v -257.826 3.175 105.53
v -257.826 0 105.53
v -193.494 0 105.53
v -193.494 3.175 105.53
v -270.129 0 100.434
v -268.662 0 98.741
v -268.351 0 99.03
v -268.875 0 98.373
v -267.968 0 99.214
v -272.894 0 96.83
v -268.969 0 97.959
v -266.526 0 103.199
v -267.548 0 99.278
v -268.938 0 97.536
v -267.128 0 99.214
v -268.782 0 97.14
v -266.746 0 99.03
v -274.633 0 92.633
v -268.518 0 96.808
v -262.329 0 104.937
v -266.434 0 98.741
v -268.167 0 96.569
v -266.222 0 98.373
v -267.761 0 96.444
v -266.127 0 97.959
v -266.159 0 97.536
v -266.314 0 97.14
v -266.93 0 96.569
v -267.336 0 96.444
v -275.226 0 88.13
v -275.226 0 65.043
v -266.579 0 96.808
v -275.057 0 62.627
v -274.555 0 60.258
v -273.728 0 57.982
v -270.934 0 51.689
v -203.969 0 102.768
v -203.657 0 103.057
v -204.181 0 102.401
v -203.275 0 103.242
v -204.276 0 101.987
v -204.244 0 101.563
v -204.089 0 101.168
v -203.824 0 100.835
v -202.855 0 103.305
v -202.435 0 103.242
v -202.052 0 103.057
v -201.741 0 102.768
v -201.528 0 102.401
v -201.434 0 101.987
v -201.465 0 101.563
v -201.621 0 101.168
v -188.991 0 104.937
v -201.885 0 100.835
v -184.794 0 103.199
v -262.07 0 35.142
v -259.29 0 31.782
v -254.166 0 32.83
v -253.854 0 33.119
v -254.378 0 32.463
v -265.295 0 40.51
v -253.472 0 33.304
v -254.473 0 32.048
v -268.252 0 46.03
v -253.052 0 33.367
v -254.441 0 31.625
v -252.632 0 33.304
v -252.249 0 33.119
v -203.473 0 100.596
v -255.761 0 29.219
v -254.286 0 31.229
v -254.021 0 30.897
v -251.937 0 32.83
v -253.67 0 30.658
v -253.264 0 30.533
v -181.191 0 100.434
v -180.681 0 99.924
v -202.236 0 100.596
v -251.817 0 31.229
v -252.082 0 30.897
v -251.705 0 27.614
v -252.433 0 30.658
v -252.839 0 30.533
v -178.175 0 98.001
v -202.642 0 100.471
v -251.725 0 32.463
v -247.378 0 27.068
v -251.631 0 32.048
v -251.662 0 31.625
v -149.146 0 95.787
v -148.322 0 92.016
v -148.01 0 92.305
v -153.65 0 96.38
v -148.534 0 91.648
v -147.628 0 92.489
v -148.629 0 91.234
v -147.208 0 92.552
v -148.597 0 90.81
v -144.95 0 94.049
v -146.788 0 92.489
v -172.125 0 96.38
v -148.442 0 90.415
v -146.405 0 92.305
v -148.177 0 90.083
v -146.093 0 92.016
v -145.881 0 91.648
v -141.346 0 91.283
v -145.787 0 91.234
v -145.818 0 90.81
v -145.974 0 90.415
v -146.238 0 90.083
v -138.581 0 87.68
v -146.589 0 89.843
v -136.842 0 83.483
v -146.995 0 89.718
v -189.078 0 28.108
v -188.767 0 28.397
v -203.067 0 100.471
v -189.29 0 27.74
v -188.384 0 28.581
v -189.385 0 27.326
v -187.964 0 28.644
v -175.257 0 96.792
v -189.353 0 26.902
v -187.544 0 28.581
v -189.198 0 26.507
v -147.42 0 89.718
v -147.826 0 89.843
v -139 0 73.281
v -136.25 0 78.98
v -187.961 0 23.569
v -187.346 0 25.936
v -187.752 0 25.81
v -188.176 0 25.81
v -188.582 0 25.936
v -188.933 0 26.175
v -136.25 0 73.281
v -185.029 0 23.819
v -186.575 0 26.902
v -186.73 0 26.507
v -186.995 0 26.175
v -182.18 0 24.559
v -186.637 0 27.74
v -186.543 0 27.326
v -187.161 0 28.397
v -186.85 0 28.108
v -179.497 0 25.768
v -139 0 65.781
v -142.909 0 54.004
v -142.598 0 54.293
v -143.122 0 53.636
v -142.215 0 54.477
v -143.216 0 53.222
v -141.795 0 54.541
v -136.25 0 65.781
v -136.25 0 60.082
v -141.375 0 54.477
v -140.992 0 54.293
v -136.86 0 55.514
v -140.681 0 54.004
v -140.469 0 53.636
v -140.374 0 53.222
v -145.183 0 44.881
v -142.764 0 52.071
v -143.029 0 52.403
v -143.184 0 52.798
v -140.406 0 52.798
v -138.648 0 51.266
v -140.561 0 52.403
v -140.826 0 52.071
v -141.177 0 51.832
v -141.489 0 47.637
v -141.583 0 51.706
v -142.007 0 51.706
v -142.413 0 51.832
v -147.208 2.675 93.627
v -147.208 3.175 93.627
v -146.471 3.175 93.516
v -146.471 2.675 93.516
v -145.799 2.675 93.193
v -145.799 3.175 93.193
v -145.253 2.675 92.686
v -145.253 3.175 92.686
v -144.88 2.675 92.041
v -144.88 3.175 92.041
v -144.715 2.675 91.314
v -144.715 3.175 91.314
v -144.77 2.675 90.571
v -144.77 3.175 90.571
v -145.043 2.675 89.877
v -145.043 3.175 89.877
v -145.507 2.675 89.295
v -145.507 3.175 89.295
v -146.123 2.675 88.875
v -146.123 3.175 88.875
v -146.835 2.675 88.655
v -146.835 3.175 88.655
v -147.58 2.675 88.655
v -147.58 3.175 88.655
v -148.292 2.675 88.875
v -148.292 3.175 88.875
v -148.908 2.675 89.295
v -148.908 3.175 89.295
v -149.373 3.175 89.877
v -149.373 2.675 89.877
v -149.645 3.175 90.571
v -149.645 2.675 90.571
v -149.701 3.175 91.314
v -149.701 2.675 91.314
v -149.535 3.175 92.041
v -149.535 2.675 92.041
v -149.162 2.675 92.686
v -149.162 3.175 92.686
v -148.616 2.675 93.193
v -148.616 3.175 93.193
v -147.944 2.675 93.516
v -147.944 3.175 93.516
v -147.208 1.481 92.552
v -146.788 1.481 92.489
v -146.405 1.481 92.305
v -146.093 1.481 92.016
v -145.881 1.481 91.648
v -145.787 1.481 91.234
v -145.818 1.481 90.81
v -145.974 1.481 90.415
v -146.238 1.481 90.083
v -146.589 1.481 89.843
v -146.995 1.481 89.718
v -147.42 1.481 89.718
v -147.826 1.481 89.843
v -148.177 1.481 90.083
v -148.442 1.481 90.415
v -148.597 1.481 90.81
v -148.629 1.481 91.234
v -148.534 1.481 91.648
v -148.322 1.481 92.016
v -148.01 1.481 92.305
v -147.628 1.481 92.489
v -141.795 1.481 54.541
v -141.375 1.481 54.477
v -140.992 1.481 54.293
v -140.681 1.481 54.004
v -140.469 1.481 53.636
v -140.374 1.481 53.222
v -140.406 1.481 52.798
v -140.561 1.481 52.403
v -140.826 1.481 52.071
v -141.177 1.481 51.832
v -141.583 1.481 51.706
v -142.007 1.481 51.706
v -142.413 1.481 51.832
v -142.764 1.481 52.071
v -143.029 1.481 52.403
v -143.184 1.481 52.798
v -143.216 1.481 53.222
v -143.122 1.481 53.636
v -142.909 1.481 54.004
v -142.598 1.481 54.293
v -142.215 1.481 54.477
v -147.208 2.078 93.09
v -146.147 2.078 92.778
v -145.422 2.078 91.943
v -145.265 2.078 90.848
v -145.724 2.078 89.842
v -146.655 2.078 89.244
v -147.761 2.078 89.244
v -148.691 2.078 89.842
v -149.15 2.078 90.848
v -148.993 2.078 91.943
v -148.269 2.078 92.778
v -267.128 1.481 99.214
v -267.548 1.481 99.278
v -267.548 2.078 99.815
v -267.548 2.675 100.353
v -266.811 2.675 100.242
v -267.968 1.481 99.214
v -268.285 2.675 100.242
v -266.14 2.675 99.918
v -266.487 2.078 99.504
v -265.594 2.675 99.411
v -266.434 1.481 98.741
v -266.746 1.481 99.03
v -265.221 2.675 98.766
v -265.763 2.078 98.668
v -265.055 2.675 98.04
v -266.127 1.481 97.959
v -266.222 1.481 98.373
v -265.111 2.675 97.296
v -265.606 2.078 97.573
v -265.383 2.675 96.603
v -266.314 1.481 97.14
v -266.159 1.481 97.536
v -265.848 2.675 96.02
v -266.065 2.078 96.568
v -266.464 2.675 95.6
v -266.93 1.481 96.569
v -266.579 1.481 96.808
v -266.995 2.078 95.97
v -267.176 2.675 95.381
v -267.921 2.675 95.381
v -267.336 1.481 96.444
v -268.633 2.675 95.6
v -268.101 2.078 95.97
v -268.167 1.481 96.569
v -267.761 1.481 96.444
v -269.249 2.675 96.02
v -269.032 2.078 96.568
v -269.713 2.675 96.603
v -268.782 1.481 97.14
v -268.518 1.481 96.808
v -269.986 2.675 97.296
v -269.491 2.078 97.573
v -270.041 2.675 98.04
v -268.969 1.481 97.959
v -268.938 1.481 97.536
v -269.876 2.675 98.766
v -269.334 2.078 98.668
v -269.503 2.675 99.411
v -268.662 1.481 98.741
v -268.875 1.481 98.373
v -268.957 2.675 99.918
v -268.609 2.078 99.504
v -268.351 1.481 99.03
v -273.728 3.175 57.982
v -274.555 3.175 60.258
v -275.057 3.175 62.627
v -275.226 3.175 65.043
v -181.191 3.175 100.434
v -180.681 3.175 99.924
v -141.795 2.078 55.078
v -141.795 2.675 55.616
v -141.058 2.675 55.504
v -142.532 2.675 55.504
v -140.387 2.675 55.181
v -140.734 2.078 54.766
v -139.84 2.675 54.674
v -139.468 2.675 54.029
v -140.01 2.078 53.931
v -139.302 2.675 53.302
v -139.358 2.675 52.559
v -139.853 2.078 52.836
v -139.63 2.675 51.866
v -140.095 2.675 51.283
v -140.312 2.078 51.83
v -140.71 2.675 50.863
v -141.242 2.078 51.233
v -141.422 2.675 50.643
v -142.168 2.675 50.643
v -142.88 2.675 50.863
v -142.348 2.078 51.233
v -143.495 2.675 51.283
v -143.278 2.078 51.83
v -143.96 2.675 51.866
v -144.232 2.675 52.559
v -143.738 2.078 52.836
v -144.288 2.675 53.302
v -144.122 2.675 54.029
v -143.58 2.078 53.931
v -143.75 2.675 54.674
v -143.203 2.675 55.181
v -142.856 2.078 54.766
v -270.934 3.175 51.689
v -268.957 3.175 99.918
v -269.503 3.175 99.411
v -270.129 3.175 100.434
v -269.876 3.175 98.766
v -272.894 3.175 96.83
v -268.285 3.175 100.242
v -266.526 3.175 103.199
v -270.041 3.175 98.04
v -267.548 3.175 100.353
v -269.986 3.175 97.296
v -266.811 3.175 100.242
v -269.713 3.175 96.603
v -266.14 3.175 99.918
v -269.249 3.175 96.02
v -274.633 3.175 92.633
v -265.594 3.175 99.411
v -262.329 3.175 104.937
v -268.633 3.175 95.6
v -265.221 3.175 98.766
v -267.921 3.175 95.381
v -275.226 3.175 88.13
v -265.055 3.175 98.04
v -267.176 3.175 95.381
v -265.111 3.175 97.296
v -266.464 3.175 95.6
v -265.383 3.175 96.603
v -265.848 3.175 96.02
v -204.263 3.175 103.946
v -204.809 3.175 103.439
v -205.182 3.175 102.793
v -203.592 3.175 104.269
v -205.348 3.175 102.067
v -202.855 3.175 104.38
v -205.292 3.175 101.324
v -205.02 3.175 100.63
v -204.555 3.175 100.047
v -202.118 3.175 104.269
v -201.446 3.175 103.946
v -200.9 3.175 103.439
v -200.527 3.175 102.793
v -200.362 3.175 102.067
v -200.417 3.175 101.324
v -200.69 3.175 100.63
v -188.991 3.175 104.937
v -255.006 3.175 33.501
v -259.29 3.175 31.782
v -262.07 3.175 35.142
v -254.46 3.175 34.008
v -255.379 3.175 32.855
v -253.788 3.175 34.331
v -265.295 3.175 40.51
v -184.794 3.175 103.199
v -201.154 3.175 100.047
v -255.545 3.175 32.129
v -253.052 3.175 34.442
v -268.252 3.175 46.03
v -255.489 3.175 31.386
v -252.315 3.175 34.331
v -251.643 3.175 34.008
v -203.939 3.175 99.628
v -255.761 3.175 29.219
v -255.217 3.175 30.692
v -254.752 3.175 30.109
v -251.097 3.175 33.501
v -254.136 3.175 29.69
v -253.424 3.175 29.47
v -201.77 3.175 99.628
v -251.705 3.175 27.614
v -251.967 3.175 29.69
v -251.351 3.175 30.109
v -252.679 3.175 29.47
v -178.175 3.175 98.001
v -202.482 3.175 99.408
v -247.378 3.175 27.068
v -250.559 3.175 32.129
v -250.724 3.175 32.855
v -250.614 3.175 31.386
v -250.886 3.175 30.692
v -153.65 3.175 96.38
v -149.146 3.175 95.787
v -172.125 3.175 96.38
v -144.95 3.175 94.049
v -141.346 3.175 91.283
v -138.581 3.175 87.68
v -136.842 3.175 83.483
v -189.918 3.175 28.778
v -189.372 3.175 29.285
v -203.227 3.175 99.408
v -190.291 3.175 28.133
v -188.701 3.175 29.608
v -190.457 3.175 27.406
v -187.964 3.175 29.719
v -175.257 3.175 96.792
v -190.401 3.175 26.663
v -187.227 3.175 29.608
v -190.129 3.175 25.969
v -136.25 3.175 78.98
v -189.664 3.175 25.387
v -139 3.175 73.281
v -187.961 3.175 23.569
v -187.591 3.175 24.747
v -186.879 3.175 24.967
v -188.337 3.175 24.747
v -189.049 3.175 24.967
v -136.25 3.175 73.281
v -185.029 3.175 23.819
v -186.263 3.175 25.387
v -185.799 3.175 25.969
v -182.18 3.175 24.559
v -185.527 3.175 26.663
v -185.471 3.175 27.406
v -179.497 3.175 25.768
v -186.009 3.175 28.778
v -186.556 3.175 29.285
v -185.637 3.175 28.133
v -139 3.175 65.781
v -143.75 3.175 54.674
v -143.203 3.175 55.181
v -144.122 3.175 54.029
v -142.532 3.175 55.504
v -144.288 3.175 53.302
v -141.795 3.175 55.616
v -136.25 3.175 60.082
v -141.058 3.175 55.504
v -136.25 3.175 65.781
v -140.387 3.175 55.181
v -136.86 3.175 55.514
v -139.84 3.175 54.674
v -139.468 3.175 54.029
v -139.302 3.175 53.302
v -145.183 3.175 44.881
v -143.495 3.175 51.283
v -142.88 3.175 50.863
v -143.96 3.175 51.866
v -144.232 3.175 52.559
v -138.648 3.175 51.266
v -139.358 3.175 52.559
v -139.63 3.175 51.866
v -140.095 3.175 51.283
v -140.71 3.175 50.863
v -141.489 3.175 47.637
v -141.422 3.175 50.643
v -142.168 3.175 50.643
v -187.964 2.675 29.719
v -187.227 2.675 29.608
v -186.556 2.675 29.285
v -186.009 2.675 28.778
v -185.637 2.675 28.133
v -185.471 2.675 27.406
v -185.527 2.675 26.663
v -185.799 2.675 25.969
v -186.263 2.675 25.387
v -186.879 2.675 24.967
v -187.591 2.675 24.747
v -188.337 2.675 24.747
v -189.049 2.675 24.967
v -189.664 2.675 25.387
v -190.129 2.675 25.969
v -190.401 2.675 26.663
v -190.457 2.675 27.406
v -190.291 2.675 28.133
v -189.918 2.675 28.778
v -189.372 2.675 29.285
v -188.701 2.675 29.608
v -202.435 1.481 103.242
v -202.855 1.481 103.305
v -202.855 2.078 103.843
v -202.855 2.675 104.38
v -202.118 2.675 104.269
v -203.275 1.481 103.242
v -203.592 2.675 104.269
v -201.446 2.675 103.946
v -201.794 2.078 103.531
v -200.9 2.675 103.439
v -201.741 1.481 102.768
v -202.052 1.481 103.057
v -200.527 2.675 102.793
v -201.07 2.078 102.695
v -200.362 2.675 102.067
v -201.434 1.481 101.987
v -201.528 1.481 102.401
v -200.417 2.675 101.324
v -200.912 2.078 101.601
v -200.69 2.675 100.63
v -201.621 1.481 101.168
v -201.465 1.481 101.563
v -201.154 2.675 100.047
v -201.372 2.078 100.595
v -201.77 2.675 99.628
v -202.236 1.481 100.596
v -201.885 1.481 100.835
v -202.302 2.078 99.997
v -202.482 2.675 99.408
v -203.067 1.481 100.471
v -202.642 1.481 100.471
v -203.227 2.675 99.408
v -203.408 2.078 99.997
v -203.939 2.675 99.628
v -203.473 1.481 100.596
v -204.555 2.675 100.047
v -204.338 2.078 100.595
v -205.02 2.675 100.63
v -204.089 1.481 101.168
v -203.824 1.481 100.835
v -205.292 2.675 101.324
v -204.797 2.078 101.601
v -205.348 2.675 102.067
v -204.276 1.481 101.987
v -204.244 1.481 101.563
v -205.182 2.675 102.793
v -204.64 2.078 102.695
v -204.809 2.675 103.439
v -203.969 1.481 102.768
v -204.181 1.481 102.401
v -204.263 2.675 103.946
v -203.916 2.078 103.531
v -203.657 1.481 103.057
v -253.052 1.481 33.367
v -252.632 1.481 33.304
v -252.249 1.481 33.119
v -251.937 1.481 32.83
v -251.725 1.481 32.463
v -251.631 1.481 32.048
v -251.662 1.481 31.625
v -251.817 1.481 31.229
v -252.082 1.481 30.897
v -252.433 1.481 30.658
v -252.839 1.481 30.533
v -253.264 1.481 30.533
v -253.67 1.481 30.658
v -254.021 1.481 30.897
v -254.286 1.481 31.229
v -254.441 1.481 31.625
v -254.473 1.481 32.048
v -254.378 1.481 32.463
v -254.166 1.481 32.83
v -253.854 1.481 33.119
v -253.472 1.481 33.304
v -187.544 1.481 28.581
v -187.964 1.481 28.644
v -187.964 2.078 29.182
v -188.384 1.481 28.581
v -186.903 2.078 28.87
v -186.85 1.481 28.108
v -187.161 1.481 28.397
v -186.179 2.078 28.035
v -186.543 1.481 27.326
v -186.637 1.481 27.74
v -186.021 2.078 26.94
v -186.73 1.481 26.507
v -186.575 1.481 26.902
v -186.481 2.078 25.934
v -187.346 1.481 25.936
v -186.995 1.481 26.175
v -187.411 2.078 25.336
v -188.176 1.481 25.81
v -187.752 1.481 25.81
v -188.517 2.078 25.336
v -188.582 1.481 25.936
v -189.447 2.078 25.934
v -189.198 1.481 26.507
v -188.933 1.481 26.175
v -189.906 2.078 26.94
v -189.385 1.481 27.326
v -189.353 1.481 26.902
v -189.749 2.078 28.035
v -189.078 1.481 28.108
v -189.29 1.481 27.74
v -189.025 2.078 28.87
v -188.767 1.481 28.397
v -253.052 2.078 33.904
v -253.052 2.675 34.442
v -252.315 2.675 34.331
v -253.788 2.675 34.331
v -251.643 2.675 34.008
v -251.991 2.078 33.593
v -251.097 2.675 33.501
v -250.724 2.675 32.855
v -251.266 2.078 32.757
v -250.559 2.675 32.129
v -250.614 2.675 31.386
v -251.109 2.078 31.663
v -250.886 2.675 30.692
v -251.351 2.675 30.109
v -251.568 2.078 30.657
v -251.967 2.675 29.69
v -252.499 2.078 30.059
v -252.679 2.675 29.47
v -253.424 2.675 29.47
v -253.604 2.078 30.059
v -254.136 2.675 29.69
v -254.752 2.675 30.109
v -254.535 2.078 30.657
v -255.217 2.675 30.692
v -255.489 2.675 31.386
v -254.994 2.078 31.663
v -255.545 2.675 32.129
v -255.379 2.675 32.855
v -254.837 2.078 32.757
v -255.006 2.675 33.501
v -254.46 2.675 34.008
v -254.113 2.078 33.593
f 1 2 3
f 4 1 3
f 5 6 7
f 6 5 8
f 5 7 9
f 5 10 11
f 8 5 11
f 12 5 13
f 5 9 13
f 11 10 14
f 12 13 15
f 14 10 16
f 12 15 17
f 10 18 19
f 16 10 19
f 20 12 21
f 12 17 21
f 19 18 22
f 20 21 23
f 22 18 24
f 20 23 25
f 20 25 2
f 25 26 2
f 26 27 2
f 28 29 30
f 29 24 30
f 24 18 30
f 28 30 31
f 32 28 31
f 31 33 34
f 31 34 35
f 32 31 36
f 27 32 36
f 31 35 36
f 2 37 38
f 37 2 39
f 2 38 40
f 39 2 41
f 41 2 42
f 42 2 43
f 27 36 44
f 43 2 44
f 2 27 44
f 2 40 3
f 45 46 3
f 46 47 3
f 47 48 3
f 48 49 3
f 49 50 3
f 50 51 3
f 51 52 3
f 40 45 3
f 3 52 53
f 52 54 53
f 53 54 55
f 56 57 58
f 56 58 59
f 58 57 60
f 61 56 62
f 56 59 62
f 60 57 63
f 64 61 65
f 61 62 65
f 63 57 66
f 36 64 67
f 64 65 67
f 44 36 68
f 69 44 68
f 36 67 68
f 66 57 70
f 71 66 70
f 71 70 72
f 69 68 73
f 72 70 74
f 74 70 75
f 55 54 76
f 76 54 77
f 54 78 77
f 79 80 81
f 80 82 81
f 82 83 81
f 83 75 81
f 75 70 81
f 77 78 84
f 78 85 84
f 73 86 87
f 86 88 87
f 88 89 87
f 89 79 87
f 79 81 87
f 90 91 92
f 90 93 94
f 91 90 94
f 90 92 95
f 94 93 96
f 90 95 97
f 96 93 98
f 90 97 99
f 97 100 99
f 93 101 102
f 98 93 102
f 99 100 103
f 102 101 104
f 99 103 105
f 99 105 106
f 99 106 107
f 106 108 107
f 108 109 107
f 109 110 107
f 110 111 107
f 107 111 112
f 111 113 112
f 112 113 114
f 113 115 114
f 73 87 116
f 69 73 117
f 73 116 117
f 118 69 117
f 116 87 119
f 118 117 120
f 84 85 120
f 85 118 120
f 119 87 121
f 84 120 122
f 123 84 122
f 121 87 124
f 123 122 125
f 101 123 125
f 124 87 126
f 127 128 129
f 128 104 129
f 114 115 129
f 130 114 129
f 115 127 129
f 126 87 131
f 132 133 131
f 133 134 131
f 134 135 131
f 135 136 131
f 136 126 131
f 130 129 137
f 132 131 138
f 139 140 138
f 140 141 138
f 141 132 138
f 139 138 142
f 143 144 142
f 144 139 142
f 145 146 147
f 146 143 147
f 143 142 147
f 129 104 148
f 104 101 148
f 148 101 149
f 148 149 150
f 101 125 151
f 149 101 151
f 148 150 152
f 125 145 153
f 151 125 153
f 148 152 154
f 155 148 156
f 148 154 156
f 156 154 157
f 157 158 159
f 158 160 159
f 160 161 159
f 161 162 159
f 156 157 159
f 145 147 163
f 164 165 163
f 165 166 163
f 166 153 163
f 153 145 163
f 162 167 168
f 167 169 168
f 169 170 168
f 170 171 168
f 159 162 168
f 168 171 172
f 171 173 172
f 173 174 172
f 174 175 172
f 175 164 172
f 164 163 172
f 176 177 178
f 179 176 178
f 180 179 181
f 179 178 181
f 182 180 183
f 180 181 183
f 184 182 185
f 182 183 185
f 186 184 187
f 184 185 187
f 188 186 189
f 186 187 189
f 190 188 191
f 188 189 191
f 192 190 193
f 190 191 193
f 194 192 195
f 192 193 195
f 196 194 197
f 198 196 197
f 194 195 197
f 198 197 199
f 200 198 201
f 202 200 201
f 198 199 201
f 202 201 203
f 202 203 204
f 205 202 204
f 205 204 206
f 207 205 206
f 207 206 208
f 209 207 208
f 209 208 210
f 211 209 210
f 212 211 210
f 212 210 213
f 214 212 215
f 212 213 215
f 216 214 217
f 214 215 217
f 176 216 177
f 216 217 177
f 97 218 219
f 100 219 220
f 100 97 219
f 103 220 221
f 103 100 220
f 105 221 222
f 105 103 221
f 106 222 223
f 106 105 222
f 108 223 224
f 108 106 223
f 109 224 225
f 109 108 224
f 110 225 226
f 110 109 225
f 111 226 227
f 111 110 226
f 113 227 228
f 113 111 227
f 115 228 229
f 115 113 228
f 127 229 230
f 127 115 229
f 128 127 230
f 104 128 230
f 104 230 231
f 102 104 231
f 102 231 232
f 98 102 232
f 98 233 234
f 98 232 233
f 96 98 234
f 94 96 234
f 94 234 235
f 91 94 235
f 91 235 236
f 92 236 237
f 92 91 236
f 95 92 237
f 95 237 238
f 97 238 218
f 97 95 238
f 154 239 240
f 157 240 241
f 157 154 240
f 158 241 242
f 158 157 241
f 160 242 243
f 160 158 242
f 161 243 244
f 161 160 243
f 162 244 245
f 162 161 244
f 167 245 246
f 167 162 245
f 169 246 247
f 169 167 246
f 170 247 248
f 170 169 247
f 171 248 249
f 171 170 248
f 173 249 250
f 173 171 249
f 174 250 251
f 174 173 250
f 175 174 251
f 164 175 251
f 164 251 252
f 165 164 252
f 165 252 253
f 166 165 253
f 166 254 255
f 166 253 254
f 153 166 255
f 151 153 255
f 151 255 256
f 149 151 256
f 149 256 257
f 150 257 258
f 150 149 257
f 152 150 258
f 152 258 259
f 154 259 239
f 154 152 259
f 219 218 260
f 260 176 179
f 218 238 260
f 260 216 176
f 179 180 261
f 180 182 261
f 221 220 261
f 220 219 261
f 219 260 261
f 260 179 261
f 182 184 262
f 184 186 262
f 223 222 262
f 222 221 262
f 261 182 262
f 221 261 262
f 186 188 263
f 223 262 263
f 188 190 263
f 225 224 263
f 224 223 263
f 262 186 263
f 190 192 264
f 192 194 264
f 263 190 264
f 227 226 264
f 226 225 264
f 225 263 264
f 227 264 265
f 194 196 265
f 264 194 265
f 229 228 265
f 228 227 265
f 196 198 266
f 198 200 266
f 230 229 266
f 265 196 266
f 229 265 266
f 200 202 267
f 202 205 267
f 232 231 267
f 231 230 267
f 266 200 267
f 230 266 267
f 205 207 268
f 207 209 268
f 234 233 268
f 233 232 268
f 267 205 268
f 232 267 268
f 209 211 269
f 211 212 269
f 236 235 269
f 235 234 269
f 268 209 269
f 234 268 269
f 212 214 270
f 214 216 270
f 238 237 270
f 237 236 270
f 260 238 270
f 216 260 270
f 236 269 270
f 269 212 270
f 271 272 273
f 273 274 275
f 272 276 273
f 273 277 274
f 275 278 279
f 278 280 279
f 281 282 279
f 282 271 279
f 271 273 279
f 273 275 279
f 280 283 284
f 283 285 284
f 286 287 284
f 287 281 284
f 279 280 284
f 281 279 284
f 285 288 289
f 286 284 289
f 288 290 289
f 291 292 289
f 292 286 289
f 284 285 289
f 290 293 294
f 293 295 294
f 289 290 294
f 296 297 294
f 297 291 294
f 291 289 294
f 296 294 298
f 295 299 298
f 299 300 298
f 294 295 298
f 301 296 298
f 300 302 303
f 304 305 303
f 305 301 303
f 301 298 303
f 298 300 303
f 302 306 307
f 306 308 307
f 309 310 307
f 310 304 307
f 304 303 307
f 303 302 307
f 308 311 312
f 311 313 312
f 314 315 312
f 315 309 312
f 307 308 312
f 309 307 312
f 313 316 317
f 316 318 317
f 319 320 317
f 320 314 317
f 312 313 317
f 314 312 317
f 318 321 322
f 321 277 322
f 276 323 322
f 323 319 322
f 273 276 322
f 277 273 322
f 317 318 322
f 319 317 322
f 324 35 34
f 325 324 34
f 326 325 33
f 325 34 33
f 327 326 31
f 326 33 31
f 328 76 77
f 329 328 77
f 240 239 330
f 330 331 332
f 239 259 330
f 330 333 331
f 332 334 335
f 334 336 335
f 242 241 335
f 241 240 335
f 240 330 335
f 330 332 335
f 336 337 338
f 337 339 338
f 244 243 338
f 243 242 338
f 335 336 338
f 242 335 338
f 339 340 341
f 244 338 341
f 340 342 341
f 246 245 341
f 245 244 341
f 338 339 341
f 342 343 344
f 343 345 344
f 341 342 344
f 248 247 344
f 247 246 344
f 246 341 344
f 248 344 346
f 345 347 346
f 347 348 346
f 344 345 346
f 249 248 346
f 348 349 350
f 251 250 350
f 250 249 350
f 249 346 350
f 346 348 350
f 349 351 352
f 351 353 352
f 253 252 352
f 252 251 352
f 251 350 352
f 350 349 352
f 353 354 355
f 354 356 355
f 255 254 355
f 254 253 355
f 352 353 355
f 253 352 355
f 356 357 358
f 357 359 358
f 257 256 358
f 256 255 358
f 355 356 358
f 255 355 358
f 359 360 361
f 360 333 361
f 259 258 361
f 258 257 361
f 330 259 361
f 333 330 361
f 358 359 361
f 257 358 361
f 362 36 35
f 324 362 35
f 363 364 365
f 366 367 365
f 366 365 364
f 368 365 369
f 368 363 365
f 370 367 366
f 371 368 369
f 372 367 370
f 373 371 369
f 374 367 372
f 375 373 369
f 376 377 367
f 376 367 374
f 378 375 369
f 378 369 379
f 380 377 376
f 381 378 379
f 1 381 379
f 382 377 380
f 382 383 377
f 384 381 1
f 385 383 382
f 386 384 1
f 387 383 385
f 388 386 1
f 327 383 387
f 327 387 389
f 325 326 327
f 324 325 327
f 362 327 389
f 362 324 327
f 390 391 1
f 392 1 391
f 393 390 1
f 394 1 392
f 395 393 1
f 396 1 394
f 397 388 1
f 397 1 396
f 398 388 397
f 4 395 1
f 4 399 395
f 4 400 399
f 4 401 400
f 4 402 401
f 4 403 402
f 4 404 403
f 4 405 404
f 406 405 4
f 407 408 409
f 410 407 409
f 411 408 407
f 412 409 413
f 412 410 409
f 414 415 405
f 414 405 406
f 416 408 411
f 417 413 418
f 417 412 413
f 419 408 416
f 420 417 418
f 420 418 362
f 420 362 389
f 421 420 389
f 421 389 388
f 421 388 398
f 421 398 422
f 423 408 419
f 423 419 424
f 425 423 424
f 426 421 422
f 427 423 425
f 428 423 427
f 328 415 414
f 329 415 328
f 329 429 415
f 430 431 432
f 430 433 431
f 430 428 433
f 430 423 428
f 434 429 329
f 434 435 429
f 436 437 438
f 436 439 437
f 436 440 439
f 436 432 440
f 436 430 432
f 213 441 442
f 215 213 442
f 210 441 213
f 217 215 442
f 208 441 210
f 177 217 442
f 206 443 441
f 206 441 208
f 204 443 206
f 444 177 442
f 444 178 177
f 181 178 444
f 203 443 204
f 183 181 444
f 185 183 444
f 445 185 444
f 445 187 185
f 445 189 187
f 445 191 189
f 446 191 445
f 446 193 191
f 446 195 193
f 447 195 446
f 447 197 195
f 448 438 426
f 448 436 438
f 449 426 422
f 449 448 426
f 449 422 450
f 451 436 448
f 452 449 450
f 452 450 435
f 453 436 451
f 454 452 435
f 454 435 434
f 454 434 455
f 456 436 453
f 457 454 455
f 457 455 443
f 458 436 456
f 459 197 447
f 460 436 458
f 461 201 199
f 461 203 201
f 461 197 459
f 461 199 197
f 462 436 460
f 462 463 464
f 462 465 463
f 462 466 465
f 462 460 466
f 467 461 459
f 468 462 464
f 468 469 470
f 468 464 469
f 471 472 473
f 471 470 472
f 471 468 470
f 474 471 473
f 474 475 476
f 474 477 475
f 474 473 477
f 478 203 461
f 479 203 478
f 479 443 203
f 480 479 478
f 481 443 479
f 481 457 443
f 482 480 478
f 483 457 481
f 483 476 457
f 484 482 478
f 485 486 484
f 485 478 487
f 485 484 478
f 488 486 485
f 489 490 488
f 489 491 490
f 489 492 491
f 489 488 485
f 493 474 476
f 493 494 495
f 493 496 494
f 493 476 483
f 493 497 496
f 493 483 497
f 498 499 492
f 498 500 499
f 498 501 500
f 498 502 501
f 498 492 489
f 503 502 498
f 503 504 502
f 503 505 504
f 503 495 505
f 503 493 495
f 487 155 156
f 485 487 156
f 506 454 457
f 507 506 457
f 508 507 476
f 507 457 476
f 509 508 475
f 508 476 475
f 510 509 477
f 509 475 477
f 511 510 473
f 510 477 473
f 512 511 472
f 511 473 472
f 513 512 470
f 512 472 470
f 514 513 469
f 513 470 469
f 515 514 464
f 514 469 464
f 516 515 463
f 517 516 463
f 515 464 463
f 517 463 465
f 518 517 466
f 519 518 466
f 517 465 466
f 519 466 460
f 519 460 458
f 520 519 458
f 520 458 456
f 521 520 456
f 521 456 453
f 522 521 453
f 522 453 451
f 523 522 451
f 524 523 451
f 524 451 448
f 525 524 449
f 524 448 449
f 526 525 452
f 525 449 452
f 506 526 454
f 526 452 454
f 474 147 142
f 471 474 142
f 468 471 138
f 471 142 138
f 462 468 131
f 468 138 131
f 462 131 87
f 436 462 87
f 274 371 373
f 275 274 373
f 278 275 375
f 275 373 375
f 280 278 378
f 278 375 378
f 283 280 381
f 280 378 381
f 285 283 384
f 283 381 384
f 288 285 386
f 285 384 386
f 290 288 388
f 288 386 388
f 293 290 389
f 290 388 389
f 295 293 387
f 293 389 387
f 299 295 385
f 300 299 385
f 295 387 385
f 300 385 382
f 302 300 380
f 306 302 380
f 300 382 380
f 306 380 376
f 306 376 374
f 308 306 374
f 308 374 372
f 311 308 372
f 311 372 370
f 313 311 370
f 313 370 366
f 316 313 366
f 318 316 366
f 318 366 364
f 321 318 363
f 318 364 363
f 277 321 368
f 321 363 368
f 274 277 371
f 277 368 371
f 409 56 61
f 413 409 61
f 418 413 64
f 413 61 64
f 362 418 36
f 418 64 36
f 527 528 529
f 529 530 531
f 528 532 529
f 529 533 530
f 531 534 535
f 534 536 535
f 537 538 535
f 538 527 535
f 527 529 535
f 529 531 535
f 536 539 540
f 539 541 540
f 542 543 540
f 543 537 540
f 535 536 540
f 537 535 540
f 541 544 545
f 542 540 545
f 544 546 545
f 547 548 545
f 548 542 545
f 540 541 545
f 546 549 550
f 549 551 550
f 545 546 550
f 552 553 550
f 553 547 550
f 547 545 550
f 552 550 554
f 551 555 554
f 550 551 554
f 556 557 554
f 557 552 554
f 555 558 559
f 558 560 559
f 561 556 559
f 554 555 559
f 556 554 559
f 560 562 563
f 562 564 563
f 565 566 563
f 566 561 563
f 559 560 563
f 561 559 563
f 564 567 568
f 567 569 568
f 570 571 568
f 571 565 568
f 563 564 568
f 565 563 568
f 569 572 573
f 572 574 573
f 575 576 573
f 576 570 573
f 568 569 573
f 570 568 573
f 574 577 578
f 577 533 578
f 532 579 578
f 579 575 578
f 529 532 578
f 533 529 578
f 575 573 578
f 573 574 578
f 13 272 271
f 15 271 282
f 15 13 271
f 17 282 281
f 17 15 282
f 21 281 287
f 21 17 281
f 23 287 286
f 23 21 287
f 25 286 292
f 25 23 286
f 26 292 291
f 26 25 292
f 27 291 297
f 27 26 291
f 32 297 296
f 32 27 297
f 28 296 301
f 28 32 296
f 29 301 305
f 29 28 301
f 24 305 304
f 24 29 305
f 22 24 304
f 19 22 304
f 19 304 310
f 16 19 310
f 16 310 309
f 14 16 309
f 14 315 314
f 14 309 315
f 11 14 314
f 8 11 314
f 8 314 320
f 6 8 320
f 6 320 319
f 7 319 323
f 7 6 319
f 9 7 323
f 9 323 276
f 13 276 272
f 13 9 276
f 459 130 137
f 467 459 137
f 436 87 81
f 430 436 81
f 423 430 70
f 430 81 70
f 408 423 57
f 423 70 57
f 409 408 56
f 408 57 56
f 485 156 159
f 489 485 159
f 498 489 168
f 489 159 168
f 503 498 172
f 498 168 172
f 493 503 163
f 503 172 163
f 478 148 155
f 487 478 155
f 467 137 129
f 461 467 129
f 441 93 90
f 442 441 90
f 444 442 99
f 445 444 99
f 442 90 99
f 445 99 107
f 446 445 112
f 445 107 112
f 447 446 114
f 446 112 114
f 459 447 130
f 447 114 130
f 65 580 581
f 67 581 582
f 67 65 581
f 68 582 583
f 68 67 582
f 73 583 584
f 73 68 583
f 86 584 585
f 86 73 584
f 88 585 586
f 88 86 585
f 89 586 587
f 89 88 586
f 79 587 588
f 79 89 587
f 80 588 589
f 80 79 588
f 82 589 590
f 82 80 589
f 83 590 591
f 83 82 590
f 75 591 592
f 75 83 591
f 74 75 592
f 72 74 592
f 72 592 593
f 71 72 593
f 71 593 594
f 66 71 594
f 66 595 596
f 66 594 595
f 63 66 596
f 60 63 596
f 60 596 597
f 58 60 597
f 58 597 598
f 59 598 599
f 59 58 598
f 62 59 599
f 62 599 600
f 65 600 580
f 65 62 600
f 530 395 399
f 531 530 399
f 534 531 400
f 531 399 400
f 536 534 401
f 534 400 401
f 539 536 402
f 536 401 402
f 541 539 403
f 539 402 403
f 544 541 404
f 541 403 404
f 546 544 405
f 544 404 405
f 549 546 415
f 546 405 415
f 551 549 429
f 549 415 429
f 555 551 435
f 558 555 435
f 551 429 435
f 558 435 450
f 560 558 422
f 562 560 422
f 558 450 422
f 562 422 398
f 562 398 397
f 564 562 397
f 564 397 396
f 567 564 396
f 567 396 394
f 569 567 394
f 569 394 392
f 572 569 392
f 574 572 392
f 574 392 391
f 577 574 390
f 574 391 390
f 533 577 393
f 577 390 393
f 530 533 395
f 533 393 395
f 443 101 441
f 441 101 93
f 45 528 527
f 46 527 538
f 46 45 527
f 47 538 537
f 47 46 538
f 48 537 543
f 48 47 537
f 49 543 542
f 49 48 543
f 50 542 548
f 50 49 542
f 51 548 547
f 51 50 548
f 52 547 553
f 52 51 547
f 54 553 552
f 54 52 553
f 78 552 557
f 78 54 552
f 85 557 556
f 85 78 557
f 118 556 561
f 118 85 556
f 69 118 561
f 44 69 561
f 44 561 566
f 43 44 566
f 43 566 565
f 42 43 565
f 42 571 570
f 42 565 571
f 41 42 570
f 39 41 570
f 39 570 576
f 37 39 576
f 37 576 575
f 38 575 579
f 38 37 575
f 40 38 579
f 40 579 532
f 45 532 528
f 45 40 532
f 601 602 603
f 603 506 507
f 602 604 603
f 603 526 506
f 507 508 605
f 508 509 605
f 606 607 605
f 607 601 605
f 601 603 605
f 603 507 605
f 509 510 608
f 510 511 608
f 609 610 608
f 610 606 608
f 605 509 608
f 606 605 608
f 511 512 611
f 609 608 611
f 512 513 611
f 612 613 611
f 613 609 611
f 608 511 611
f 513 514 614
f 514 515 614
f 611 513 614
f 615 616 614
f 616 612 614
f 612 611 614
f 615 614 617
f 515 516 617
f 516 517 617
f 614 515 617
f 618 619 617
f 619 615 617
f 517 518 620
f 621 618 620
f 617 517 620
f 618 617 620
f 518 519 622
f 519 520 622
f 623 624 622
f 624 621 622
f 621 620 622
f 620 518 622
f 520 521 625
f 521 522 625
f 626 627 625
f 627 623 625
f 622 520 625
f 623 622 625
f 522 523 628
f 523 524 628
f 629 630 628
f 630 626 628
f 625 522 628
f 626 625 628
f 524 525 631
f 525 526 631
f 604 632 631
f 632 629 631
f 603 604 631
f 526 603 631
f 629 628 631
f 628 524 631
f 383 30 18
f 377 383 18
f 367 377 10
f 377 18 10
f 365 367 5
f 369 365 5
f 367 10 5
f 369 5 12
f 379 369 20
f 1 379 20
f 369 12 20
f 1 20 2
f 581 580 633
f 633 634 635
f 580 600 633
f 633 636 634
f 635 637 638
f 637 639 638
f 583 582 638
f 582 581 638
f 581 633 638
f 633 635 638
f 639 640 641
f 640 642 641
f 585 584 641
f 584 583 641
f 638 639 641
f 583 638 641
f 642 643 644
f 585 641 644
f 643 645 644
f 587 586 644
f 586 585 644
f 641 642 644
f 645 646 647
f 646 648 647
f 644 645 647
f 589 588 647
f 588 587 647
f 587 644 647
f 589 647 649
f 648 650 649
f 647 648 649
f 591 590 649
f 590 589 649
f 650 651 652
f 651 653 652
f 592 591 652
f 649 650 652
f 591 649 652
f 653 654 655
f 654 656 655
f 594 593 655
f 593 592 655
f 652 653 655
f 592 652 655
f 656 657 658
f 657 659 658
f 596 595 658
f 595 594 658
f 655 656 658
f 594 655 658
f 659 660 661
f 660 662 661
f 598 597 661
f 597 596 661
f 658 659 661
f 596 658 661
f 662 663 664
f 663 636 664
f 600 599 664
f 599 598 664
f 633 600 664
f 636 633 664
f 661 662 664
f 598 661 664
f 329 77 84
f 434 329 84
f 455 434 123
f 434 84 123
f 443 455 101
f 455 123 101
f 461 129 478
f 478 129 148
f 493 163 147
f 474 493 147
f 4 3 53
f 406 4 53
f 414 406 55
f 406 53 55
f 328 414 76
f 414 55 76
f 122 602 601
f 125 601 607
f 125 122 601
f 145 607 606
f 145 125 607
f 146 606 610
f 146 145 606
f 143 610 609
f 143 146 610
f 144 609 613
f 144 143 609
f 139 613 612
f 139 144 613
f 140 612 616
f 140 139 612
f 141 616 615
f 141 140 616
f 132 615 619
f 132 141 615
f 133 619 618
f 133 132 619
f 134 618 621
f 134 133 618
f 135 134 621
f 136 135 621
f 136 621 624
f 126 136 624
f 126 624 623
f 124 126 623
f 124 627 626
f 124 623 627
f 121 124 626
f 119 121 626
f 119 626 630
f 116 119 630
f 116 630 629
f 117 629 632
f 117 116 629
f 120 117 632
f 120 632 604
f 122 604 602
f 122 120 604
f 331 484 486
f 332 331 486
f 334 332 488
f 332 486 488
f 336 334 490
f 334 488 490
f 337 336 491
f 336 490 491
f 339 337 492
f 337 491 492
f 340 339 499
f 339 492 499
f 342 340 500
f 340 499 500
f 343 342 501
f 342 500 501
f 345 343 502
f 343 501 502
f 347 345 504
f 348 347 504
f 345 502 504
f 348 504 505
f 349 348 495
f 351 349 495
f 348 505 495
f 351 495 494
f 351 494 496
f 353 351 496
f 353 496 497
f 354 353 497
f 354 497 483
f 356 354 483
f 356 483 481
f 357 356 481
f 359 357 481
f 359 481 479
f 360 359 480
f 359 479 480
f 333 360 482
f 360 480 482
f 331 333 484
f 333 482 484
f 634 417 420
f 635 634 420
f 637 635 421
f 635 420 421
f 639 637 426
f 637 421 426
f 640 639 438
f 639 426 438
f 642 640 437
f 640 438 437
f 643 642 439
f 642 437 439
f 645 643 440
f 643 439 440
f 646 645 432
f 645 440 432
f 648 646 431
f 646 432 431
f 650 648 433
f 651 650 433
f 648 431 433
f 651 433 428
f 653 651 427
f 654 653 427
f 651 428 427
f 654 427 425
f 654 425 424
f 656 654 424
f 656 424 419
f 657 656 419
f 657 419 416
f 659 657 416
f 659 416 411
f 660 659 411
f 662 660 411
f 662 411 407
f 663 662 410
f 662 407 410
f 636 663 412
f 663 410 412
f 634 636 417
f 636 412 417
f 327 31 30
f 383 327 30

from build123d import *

# Parameters (mm, degrees)
SKETCH2_R                    = 1.425
BOSS_EXTRUDE1_DEPTH          = 3.175
SKETCH3_R                    = 2.5
CUT_EXTRUDE1_DEPTH           = 0.5
SKETCH4_R                    = 2.5
CUT_EXTRUDE2_DEPTH           = 1.2
CUT_EXTRUDE2_DRAFT           = -42
CUT_EXTRUDE2_PROFILE_2_DEPTH = 1.2
CUT_EXTRUDE2_PROFILE_2_DRAFT = -42
CUT_EXTRUDE2_PROFILE_3_DEPTH = 1.2
CUT_EXTRUDE2_PROFILE_3_DRAFT = -42
CUT_EXTRUDE2_PROFILE_4_DEPTH = 1.2
CUT_EXTRUDE2_PROFILE_4_DRAFT = -42
CUT_EXTRUDE2_PROFILE_5_DEPTH = 1.2
CUT_EXTRUDE2_PROFILE_5_DRAFT = -42
CUT_EXTRUDE2_PROFILE_6_DEPTH = 1.2
CUT_EXTRUDE2_PROFILE_6_DRAFT = -42


with BuildPart() as part:
    # Sketch2 → Boss-Extrude1 (new body)
    with BuildSketch(Plane(origin=(0, 0, 0), x_dir=(1, 0, 0), z_dir=(0, 1, 0))):
        with BuildLine():
            Line((-145.18277075, -44.880968233), (-179.497120097, -25.768390824))
            ThreePointArc((-179.497120097, -25.768390824), (-183.588653035, -24.128556812), (-187.960968922, -23.569494069))
            Line((-187.960968922, -23.569494069), (-247.377604545, -27.068041697))
            ThreePointArc((-247.377604545, -27.068041697), (-255.760524502, -29.218913898), (-262.07032604, -35.142257782))
            ThreePointArc((-262.07032604, -35.142257782), (-266.807761783, -43.251676507), (-270.933745897, -51.688632391))
            Line((-270.933745897, -51.688632391), (-273.728235609, -57.981701498))
            ThreePointArc((-273.728235609, -57.981701498), (-274.847170355, -61.434035543), (-275.2256366, -65.043382939))
            Line((-275.2256366, -65.043382939), (-275.2256366, -88.130010281))
            ThreePointArc((-275.2256366, -88.130010281), (-270.129294593, -100.433668273), (-257.8256366, -105.530010281))
            Line((-257.8256366, -105.530010281), (-193.494425739, -105.530010281))
            ThreePointArc((-193.494425739, -105.530010281), (-186.835734016, -104.205514146), (-181.190767747, -100.433668273))
            Line((-181.190767747, -100.433668273), (-180.680815133, -99.923715659))
            ThreePointArc((-180.680815133, -99.923715659), (-176.755292612, -97.300765368), (-172.12482308, -96.379707712))
            Line((-172.12482308, -96.379707712), (-153.649556898, -96.379707712))
            ThreePointArc((-153.649556898, -96.379707712), (-141.345898905, -91.283365704), (-136.249556898, -78.979707712))
            Line((-136.249556898, -78.979707712), (-136.249556898, -73.280889471))
            Line((-136.249556898, -73.280889471), (-138.999556898, -73.280889471))
            Line((-138.999556898, -73.280889471), (-138.999556898, -65.780889471))
            Line((-138.999556898, -65.780889471), (-136.249556898, -65.780889471))
            Line((-136.249556898, -65.780889471), (-136.249556898, -60.08207123))
            ThreePointArc((-136.249556898, -60.08207123), (-138.648188978, -51.266235449), (-145.18277075, -44.880968233))
        make_face()
        with Locations(Location((-147.207602145, -91.127288498, 0), (0, 0, 270))):
            Circle(SKETCH2_R, mode=Mode.SUBTRACT)
        with Locations(Location((-141.795027651, -53.115534334, 0), (0, 0, 270))):
            Circle(SKETCH2_R, mode=Mode.SUBTRACT)
        with Locations(Location((-187.963906245, -27.219493821, 0), (0, 0, 270))):
            Circle(SKETCH2_R, mode=Mode.SUBTRACT)
        with Locations(Location((-253.051529835, -31.941972813, 0), (0, 0, 270))):
            Circle(SKETCH2_R, mode=Mode.SUBTRACT)
        with Locations(Location((-267.548354841, -97.852728522, 0), (0, 0, 270))):
            Circle(SKETCH2_R, mode=Mode.SUBTRACT)
        with Locations(Location((-202.85468144, -101.880010281, 0), (0, 0, 270))):
            Circle(SKETCH2_R, mode=Mode.SUBTRACT)
    extrude(amount=BOSS_EXTRUDE1_DEPTH)

    # Sketch3 → Cut-Extrude1 (cut)
    with BuildSketch(Plane(origin=(0, 3.175, 0), x_dir=(1, 0, 0), z_dir=(0, 1, 0))):
        with Locations(Location((-253.051529835, -31.941972813, 0), (0, 0, 270))):
            Circle(SKETCH3_R)
        with Locations(Location((-187.963906245, -27.219493821, 0), (0, 0, 270))):
            Circle(SKETCH3_R)
        with Locations(Location((-141.795027651, -53.115534334, 0), (0, 0, 270))):
            Circle(SKETCH3_R)
        with Locations(Location((-147.207602145, -91.127288498, 0), (0, 0, 270))):
            Circle(SKETCH3_R)
        with Locations(Location((-202.85468144, -101.880010281, 0), (0, 0, 270))):
            Circle(SKETCH3_R)
        with Locations(Location((-267.548354841, -97.852728522, 0), (0, 0, 270))):
            Circle(SKETCH3_R)
    extrude(amount=-CUT_EXTRUDE1_DEPTH, mode=Mode.SUBTRACT)


with BuildPart() as cut_extrude2_tool:
    # Sketch4 → Cut-Extrude2 (with draft: the straight prism first)
    with BuildSketch(Plane(origin=(0, 2.675, 0), x_dir=(1, 0, 0), z_dir=(0, 1, 0))):
        with Locations(Location((-267.548354841, -97.852728522, 0), (0, 0, 270))):
            Circle(SKETCH4_R)
    extrude(amount=-CUT_EXTRUDE2_DEPTH)
    # Cut-Extrude2: the draft: its side faces are tilted about the plane it starts from
    cut_extrude2_sides = [cut_extrude2_tool.faces().sort_by_distance(p)[0] for p in [
        (-267.548354841, 2.075, 95.352728522),
    ]]
    draft(cut_extrude2_sides, Plane(origin=(0, 2.675, 0), x_dir=(1, 0, 0), z_dir=(0, 1, 0)), CUT_EXTRUDE2_DRAFT)


with BuildPart() as part_1:
    add(part.part)

    # Cut-Extrude2: cut by cut_extrude2_tool
    add(cut_extrude2_tool.part, mode=Mode.SUBTRACT)


with BuildPart() as cut_extrude2_profile_2_tool:
    # Sketch4 → Cut-Extrude2 profile 2 (with draft: the straight prism first)
    with BuildSketch(Plane(origin=(0, 2.675, 0), x_dir=(1, 0, 0), z_dir=(0, 1, 0))):
        with Locations(Location((-202.85468144, -101.880010281, 0), (0, 0, 270))):
            Circle(SKETCH4_R)
    extrude(amount=-CUT_EXTRUDE2_PROFILE_2_DEPTH)
    # Cut-Extrude2 profile 2: the draft: its side faces are tilted about the plane it starts from
    cut_extrude2_profile_2_sides = [cut_extrude2_profile_2_tool.faces().sort_by_distance(p)[0] for p in [
        (-202.85468144, 2.075, 99.380010281),
    ]]
    draft(cut_extrude2_profile_2_sides, Plane(origin=(0, 2.675, 0), x_dir=(1, 0, 0), z_dir=(0, 1, 0)), CUT_EXTRUDE2_PROFILE_2_DRAFT)


with BuildPart() as part_2:
    add(part_1.part)

    # Cut-Extrude2 profile 2: cut by cut_extrude2_profile_2_tool
    add(cut_extrude2_profile_2_tool.part, mode=Mode.SUBTRACT)


with BuildPart() as cut_extrude2_profile_3_tool:
    # Sketch4 → Cut-Extrude2 profile 3 (with draft: the straight prism first)
    with BuildSketch(Plane(origin=(0, 2.675, 0), x_dir=(1, 0, 0), z_dir=(0, 1, 0))):
        with Locations(Location((-147.207602145, -91.127288498, 0), (0, 0, 270))):
            Circle(SKETCH4_R)
    extrude(amount=-CUT_EXTRUDE2_PROFILE_3_DEPTH)
    # Cut-Extrude2 profile 3: the draft: its side faces are tilted about the plane it starts from
    cut_extrude2_profile_3_sides = [cut_extrude2_profile_3_tool.faces().sort_by_distance(p)[0] for p in [
        (-147.207602145, 2.075, 88.627288498),
    ]]
    draft(cut_extrude2_profile_3_sides, Plane(origin=(0, 2.675, 0), x_dir=(1, 0, 0), z_dir=(0, 1, 0)), CUT_EXTRUDE2_PROFILE_3_DRAFT)


with BuildPart() as part_3:
    add(part_2.part)

    # Cut-Extrude2 profile 3: cut by cut_extrude2_profile_3_tool
    add(cut_extrude2_profile_3_tool.part, mode=Mode.SUBTRACT)


with BuildPart() as cut_extrude2_profile_4_tool:
    # Sketch4 → Cut-Extrude2 profile 4 (with draft: the straight prism first)
    with BuildSketch(Plane(origin=(0, 2.675, 0), x_dir=(1, 0, 0), z_dir=(0, 1, 0))):
        with Locations(Location((-141.795027651, -53.115534334, 0), (0, 0, 270))):
            Circle(SKETCH4_R)
    extrude(amount=-CUT_EXTRUDE2_PROFILE_4_DEPTH)
    # Cut-Extrude2 profile 4: the draft: its side faces are tilted about the plane it starts from
    cut_extrude2_profile_4_sides = [cut_extrude2_profile_4_tool.faces().sort_by_distance(p)[0] for p in [
        (-141.795027651, 2.075, 50.615534334),
    ]]
    draft(cut_extrude2_profile_4_sides, Plane(origin=(0, 2.675, 0), x_dir=(1, 0, 0), z_dir=(0, 1, 0)), CUT_EXTRUDE2_PROFILE_4_DRAFT)


with BuildPart() as part_4:
    add(part_3.part)

    # Cut-Extrude2 profile 4: cut by cut_extrude2_profile_4_tool
    add(cut_extrude2_profile_4_tool.part, mode=Mode.SUBTRACT)


with BuildPart() as cut_extrude2_profile_5_tool:
    # Sketch4 → Cut-Extrude2 profile 5 (with draft: the straight prism first)
    with BuildSketch(Plane(origin=(0, 2.675, 0), x_dir=(1, 0, 0), z_dir=(0, 1, 0))):
        with Locations(Location((-187.963906245, -27.219493821, 0), (0, 0, 270))):
            Circle(SKETCH4_R)
    extrude(amount=-CUT_EXTRUDE2_PROFILE_5_DEPTH)
    # Cut-Extrude2 profile 5: the draft: its side faces are tilted about the plane it starts from
    cut_extrude2_profile_5_sides = [cut_extrude2_profile_5_tool.faces().sort_by_distance(p)[0] for p in [
        (-187.963906245, 2.075, 24.719493821),
    ]]
    draft(cut_extrude2_profile_5_sides, Plane(origin=(0, 2.675, 0), x_dir=(1, 0, 0), z_dir=(0, 1, 0)), CUT_EXTRUDE2_PROFILE_5_DRAFT)


with BuildPart() as part_5:
    add(part_4.part)

    # Cut-Extrude2 profile 5: cut by cut_extrude2_profile_5_tool
    add(cut_extrude2_profile_5_tool.part, mode=Mode.SUBTRACT)


with BuildPart() as cut_extrude2_profile_6_tool:
    # Sketch4 → Cut-Extrude2 profile 6 (with draft: the straight prism first)
    with BuildSketch(Plane(origin=(0, 2.675, 0), x_dir=(1, 0, 0), z_dir=(0, 1, 0))):
        with Locations(Location((-253.051529835, -31.941972813, 0), (0, 0, 270))):
            Circle(SKETCH4_R)
    extrude(amount=-CUT_EXTRUDE2_PROFILE_6_DEPTH)
    # Cut-Extrude2 profile 6: the draft: its side faces are tilted about the plane it starts from
    cut_extrude2_profile_6_sides = [cut_extrude2_profile_6_tool.faces().sort_by_distance(p)[0] for p in [
        (-253.051529835, 2.075, 29.441972813),
    ]]
    draft(cut_extrude2_profile_6_sides, Plane(origin=(0, 2.675, 0), x_dir=(1, 0, 0), z_dir=(0, 1, 0)), CUT_EXTRUDE2_PROFILE_6_DRAFT)


with BuildPart() as part_6:
    add(part_5.part)

    # Cut-Extrude2 profile 6: cut by cut_extrude2_profile_6_tool
    add(cut_extrude2_profile_6_tool.part, mode=Mode.SUBTRACT)


solid = part_6.part
